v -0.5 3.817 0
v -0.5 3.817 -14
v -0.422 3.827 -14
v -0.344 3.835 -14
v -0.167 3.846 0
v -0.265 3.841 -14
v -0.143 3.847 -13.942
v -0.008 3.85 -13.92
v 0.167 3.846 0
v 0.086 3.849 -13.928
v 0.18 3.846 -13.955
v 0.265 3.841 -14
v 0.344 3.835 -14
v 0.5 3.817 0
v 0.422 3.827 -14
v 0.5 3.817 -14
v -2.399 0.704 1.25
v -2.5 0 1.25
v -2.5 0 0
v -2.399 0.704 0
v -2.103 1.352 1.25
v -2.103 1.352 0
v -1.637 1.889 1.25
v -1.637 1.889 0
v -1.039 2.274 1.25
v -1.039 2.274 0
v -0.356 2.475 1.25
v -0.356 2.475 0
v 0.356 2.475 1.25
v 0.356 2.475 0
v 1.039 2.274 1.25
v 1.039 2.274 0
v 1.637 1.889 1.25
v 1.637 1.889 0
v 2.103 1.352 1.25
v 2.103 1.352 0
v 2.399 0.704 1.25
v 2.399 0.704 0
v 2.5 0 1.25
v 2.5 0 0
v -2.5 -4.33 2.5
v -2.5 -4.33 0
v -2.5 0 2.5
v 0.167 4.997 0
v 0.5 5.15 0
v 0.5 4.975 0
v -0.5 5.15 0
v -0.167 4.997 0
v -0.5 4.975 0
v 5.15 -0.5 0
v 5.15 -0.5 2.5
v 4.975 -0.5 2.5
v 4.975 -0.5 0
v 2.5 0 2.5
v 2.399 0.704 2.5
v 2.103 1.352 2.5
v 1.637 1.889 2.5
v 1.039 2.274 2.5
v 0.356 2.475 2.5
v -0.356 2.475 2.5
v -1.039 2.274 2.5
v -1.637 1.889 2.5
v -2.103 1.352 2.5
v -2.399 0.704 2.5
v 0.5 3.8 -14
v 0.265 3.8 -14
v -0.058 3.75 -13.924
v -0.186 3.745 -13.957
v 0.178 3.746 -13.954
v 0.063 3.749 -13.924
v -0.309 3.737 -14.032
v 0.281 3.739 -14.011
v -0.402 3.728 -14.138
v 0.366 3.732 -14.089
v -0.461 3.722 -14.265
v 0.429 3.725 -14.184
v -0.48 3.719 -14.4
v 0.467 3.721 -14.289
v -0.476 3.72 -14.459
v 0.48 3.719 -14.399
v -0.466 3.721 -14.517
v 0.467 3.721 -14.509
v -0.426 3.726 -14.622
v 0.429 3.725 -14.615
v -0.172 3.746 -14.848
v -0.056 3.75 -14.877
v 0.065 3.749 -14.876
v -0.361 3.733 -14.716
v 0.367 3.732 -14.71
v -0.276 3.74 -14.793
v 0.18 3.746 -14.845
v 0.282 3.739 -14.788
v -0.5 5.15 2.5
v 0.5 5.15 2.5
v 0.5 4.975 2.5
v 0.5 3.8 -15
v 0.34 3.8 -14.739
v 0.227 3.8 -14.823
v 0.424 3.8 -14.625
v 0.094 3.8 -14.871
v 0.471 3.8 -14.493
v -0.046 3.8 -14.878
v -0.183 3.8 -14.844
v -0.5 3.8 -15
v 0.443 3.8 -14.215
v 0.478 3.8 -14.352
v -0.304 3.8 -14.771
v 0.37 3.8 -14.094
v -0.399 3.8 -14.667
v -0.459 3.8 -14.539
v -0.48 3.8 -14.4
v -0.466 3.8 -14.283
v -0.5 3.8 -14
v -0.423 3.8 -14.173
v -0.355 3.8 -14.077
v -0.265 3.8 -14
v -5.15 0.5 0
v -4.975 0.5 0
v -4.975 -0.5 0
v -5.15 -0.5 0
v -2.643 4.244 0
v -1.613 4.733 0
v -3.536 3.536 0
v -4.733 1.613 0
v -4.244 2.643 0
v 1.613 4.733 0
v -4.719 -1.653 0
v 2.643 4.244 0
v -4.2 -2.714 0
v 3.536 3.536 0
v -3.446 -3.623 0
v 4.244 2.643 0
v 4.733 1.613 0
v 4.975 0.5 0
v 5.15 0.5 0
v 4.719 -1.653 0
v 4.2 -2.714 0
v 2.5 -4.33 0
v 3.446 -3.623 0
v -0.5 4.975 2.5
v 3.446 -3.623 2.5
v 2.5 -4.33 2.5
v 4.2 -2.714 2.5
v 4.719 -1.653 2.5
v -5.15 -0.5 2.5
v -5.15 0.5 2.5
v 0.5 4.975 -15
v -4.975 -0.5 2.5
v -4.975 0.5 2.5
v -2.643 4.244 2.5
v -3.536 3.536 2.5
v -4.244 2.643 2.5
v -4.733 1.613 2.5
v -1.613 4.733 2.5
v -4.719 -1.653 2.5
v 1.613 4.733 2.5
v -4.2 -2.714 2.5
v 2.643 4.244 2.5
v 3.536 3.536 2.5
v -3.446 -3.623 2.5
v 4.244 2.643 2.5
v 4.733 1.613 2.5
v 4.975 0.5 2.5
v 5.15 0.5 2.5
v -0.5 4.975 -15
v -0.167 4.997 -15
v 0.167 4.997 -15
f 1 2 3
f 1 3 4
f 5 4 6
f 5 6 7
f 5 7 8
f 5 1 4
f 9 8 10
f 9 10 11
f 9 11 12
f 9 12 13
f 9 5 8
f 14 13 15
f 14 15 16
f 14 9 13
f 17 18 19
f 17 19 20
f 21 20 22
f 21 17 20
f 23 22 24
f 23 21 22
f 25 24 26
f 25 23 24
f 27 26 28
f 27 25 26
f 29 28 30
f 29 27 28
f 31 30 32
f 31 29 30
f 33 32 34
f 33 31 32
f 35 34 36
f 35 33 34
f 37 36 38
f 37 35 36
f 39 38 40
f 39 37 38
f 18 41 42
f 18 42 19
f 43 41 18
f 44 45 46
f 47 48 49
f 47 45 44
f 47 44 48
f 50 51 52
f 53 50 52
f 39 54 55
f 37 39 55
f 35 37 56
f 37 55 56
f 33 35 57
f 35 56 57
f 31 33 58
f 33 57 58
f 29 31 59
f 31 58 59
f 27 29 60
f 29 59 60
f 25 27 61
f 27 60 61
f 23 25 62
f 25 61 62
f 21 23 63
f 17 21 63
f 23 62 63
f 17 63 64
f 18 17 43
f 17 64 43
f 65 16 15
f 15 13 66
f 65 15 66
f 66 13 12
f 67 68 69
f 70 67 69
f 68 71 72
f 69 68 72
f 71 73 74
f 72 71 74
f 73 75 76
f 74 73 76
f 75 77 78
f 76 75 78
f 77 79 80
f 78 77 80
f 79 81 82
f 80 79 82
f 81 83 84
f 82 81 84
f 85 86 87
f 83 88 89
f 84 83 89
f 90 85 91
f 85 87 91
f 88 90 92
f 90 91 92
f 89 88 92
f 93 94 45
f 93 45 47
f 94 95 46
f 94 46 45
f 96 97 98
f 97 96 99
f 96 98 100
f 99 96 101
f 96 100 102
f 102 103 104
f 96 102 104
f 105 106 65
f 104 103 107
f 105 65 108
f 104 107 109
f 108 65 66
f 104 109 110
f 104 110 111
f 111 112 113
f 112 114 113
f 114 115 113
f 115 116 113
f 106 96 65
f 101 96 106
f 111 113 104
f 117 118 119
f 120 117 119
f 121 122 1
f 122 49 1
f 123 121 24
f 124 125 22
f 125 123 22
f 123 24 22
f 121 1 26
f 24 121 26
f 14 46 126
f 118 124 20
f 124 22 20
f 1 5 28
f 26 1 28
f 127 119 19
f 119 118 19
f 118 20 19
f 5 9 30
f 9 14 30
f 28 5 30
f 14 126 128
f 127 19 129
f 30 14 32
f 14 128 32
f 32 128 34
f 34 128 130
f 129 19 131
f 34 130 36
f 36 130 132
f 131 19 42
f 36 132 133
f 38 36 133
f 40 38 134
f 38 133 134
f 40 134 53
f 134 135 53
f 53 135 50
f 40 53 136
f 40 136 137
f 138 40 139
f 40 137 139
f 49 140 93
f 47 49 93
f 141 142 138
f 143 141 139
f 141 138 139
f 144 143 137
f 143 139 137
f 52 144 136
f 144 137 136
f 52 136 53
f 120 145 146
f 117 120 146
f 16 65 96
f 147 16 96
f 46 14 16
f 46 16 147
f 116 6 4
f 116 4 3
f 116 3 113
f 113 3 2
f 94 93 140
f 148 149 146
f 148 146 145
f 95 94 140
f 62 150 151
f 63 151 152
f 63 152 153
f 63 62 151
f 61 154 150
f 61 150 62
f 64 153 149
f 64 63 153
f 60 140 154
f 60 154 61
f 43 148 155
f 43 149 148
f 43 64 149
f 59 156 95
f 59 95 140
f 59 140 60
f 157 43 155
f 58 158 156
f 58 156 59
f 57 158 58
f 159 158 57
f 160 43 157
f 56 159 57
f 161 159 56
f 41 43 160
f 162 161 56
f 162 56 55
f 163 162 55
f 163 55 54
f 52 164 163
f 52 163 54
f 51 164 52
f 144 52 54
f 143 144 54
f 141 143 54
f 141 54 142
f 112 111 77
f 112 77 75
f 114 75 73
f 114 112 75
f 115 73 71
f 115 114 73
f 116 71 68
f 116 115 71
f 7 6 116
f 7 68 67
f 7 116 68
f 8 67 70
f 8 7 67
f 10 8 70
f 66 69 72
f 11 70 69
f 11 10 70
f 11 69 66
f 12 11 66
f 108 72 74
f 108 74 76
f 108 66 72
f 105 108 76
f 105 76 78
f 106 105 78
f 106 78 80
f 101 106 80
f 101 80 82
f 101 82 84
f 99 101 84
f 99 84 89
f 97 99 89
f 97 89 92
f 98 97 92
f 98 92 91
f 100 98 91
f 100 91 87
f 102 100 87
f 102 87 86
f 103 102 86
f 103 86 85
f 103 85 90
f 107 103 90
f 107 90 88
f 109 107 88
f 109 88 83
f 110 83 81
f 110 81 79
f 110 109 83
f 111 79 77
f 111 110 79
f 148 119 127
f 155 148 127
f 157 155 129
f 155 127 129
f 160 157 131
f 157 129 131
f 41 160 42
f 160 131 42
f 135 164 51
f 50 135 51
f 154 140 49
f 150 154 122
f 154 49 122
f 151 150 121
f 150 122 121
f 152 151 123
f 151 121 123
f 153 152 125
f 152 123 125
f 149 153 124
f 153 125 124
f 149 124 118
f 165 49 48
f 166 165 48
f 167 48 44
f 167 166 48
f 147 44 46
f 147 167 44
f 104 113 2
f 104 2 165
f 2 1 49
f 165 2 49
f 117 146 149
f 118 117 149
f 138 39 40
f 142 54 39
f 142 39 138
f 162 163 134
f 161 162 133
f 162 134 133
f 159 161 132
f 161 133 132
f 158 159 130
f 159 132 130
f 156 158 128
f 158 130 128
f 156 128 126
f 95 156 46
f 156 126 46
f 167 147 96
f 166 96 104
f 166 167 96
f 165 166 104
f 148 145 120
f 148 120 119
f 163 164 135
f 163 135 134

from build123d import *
from build123d.topology import SkipClean

# Parameters (mm, degrees)
SKETCH1_R           = 5
BOSS_EXTRUDE1_DEPTH = 2.5
SKETCH6_W           = 0.25
SKETCH6_H           = 1
BOSS_EXTRUDE4_DEPTH = 2.5
CIRPATTERN1_COUNT   = 4
SKETCH8_R           = 2.5
CUT_EXTRUDE3_DEPTH  = 1.25
SKETCH9_W           = 1
SKETCH9_H           = 1.35
BOSS_EXTRUDE5_DEPTH = 15
SKETCH11_R          = 3.85
CUT_EXTRUDE4_DEPTH  = 14
SKETCH12_R          = 0.48
BOSS_EXTRUDE6_DEPTH = 7
SKETCH13_R          = 3.75
CUT_EXTRUDE5_DEPTH  = 7
CUT_EXTRUDE6_START  = 17
SKETCH14_R          = 6.794989929
SKETCH14_R_2        = 5
CUT_EXTRUDE6_DEPTH  = 17
CUT_EXTRUDE7_DEPTH  = 10


with BuildPart() as part:
    # Sketch1 → Boss-Extrude1 (new body)
    with BuildSketch(Plane.XY):
        Circle(SKETCH1_R)
    extrude(amount=BOSS_EXTRUDE1_DEPTH)

    # Sketch6 → Boss-Extrude4 (add)
    with BuildSketch(Plane.XY.offset(2.5)):
        with Locations((-5.025, 0)):
            Rectangle(SKETCH6_W, SKETCH6_H)
    boss_extrude4 = extrude(amount=-BOSS_EXTRUDE4_DEPTH)

    # CirPattern1: Boss-Extrude4 ×4 about axis
    cirpattern1_axis = Axis((0, 0, 0), (0, 0, 1))
    for i in range(1, CIRPATTERN1_COUNT):
        add(boss_extrude4.rotate(cirpattern1_axis, i * 360 / CIRPATTERN1_COUNT))

    # Sketch8 → Cut-Extrude3 (cut)
    with BuildSketch(Plane.XY.offset(2.5)):
        Circle(SKETCH8_R)
    extrude(amount=-CUT_EXTRUDE3_DEPTH, mode=Mode.SUBTRACT)

    # Sketch9 → Boss-Extrude5 (add)
    with BuildSketch(Plane(origin=(0, 0, 0), x_dir=(-1, 0, 0), z_dir=(0, 0, -1))):
        with Locations((0, 4.475)):
            Rectangle(SKETCH9_W, SKETCH9_H)
    extrude(amount=BOSS_EXTRUDE5_DEPTH)

    # Sketch11 → Cut-Extrude4 (cut)
    with BuildSketch(Plane(origin=(0, 0, 0), x_dir=(-1, 0, 0), z_dir=(0, 0, -1))):
        Circle(SKETCH11_R)
    extrude(amount=CUT_EXTRUDE4_DEPTH, mode=Mode.SUBTRACT)

    # Sketch12 → Boss-Extrude6 (add)
    with BuildSketch(Plane(origin=(0, 5.15, 0), x_dir=(1, 0, 0), z_dir=(0, 1, 0))):
        with Locations(Location((0, 14.4, 0), (0, 0, 180))):
            Circle(SKETCH12_R)
    extrude(amount=-BOSS_EXTRUDE6_DEPTH)

    # Sketch13 → Cut-Extrude5 (cut)
    with BuildSketch(Plane(origin=(0, 0, -15), x_dir=(-1, 0, 0), z_dir=(0, 0, -1))):
        Circle(SKETCH13_R)
    extrude(amount=-CUT_EXTRUDE5_DEPTH, mode=Mode.SUBTRACT)

    # Sketch14 → Cut-Extrude6 (cut)
    with BuildSketch(Plane(origin=(0, 0, 0), x_dir=(-1, 0, 0), z_dir=(0, 0, -1)).offset(CUT_EXTRUDE6_START)):
        Circle(SKETCH14_R)
        Circle(SKETCH14_R_2, mode=Mode.SUBTRACT)
    extrude(amount=-CUT_EXTRUDE6_DEPTH, mode=Mode.SUBTRACT)

    # Sketch15 → Cut-Extrude7 (cut)
    with SkipClean():  # the faces are left unmerged after this step: merging them gives an invalid solid
        with BuildSketch(Plane.XY.offset(2.5)):
            with BuildLine():
                Line((2.5, 0), (2.5, -5))
                ThreePointArc((2.5, -5), (0, -7.5), (-2.5, -5))
                Line((-2.5, -5), (-2.5, 0))
                ThreePointArc((-2.5, 0), (0, 2.5), (2.5, 0))
            make_face()
        extrude(amount=-CUT_EXTRUDE7_DEPTH, mode=Mode.SUBTRACT)


solid = part.part
